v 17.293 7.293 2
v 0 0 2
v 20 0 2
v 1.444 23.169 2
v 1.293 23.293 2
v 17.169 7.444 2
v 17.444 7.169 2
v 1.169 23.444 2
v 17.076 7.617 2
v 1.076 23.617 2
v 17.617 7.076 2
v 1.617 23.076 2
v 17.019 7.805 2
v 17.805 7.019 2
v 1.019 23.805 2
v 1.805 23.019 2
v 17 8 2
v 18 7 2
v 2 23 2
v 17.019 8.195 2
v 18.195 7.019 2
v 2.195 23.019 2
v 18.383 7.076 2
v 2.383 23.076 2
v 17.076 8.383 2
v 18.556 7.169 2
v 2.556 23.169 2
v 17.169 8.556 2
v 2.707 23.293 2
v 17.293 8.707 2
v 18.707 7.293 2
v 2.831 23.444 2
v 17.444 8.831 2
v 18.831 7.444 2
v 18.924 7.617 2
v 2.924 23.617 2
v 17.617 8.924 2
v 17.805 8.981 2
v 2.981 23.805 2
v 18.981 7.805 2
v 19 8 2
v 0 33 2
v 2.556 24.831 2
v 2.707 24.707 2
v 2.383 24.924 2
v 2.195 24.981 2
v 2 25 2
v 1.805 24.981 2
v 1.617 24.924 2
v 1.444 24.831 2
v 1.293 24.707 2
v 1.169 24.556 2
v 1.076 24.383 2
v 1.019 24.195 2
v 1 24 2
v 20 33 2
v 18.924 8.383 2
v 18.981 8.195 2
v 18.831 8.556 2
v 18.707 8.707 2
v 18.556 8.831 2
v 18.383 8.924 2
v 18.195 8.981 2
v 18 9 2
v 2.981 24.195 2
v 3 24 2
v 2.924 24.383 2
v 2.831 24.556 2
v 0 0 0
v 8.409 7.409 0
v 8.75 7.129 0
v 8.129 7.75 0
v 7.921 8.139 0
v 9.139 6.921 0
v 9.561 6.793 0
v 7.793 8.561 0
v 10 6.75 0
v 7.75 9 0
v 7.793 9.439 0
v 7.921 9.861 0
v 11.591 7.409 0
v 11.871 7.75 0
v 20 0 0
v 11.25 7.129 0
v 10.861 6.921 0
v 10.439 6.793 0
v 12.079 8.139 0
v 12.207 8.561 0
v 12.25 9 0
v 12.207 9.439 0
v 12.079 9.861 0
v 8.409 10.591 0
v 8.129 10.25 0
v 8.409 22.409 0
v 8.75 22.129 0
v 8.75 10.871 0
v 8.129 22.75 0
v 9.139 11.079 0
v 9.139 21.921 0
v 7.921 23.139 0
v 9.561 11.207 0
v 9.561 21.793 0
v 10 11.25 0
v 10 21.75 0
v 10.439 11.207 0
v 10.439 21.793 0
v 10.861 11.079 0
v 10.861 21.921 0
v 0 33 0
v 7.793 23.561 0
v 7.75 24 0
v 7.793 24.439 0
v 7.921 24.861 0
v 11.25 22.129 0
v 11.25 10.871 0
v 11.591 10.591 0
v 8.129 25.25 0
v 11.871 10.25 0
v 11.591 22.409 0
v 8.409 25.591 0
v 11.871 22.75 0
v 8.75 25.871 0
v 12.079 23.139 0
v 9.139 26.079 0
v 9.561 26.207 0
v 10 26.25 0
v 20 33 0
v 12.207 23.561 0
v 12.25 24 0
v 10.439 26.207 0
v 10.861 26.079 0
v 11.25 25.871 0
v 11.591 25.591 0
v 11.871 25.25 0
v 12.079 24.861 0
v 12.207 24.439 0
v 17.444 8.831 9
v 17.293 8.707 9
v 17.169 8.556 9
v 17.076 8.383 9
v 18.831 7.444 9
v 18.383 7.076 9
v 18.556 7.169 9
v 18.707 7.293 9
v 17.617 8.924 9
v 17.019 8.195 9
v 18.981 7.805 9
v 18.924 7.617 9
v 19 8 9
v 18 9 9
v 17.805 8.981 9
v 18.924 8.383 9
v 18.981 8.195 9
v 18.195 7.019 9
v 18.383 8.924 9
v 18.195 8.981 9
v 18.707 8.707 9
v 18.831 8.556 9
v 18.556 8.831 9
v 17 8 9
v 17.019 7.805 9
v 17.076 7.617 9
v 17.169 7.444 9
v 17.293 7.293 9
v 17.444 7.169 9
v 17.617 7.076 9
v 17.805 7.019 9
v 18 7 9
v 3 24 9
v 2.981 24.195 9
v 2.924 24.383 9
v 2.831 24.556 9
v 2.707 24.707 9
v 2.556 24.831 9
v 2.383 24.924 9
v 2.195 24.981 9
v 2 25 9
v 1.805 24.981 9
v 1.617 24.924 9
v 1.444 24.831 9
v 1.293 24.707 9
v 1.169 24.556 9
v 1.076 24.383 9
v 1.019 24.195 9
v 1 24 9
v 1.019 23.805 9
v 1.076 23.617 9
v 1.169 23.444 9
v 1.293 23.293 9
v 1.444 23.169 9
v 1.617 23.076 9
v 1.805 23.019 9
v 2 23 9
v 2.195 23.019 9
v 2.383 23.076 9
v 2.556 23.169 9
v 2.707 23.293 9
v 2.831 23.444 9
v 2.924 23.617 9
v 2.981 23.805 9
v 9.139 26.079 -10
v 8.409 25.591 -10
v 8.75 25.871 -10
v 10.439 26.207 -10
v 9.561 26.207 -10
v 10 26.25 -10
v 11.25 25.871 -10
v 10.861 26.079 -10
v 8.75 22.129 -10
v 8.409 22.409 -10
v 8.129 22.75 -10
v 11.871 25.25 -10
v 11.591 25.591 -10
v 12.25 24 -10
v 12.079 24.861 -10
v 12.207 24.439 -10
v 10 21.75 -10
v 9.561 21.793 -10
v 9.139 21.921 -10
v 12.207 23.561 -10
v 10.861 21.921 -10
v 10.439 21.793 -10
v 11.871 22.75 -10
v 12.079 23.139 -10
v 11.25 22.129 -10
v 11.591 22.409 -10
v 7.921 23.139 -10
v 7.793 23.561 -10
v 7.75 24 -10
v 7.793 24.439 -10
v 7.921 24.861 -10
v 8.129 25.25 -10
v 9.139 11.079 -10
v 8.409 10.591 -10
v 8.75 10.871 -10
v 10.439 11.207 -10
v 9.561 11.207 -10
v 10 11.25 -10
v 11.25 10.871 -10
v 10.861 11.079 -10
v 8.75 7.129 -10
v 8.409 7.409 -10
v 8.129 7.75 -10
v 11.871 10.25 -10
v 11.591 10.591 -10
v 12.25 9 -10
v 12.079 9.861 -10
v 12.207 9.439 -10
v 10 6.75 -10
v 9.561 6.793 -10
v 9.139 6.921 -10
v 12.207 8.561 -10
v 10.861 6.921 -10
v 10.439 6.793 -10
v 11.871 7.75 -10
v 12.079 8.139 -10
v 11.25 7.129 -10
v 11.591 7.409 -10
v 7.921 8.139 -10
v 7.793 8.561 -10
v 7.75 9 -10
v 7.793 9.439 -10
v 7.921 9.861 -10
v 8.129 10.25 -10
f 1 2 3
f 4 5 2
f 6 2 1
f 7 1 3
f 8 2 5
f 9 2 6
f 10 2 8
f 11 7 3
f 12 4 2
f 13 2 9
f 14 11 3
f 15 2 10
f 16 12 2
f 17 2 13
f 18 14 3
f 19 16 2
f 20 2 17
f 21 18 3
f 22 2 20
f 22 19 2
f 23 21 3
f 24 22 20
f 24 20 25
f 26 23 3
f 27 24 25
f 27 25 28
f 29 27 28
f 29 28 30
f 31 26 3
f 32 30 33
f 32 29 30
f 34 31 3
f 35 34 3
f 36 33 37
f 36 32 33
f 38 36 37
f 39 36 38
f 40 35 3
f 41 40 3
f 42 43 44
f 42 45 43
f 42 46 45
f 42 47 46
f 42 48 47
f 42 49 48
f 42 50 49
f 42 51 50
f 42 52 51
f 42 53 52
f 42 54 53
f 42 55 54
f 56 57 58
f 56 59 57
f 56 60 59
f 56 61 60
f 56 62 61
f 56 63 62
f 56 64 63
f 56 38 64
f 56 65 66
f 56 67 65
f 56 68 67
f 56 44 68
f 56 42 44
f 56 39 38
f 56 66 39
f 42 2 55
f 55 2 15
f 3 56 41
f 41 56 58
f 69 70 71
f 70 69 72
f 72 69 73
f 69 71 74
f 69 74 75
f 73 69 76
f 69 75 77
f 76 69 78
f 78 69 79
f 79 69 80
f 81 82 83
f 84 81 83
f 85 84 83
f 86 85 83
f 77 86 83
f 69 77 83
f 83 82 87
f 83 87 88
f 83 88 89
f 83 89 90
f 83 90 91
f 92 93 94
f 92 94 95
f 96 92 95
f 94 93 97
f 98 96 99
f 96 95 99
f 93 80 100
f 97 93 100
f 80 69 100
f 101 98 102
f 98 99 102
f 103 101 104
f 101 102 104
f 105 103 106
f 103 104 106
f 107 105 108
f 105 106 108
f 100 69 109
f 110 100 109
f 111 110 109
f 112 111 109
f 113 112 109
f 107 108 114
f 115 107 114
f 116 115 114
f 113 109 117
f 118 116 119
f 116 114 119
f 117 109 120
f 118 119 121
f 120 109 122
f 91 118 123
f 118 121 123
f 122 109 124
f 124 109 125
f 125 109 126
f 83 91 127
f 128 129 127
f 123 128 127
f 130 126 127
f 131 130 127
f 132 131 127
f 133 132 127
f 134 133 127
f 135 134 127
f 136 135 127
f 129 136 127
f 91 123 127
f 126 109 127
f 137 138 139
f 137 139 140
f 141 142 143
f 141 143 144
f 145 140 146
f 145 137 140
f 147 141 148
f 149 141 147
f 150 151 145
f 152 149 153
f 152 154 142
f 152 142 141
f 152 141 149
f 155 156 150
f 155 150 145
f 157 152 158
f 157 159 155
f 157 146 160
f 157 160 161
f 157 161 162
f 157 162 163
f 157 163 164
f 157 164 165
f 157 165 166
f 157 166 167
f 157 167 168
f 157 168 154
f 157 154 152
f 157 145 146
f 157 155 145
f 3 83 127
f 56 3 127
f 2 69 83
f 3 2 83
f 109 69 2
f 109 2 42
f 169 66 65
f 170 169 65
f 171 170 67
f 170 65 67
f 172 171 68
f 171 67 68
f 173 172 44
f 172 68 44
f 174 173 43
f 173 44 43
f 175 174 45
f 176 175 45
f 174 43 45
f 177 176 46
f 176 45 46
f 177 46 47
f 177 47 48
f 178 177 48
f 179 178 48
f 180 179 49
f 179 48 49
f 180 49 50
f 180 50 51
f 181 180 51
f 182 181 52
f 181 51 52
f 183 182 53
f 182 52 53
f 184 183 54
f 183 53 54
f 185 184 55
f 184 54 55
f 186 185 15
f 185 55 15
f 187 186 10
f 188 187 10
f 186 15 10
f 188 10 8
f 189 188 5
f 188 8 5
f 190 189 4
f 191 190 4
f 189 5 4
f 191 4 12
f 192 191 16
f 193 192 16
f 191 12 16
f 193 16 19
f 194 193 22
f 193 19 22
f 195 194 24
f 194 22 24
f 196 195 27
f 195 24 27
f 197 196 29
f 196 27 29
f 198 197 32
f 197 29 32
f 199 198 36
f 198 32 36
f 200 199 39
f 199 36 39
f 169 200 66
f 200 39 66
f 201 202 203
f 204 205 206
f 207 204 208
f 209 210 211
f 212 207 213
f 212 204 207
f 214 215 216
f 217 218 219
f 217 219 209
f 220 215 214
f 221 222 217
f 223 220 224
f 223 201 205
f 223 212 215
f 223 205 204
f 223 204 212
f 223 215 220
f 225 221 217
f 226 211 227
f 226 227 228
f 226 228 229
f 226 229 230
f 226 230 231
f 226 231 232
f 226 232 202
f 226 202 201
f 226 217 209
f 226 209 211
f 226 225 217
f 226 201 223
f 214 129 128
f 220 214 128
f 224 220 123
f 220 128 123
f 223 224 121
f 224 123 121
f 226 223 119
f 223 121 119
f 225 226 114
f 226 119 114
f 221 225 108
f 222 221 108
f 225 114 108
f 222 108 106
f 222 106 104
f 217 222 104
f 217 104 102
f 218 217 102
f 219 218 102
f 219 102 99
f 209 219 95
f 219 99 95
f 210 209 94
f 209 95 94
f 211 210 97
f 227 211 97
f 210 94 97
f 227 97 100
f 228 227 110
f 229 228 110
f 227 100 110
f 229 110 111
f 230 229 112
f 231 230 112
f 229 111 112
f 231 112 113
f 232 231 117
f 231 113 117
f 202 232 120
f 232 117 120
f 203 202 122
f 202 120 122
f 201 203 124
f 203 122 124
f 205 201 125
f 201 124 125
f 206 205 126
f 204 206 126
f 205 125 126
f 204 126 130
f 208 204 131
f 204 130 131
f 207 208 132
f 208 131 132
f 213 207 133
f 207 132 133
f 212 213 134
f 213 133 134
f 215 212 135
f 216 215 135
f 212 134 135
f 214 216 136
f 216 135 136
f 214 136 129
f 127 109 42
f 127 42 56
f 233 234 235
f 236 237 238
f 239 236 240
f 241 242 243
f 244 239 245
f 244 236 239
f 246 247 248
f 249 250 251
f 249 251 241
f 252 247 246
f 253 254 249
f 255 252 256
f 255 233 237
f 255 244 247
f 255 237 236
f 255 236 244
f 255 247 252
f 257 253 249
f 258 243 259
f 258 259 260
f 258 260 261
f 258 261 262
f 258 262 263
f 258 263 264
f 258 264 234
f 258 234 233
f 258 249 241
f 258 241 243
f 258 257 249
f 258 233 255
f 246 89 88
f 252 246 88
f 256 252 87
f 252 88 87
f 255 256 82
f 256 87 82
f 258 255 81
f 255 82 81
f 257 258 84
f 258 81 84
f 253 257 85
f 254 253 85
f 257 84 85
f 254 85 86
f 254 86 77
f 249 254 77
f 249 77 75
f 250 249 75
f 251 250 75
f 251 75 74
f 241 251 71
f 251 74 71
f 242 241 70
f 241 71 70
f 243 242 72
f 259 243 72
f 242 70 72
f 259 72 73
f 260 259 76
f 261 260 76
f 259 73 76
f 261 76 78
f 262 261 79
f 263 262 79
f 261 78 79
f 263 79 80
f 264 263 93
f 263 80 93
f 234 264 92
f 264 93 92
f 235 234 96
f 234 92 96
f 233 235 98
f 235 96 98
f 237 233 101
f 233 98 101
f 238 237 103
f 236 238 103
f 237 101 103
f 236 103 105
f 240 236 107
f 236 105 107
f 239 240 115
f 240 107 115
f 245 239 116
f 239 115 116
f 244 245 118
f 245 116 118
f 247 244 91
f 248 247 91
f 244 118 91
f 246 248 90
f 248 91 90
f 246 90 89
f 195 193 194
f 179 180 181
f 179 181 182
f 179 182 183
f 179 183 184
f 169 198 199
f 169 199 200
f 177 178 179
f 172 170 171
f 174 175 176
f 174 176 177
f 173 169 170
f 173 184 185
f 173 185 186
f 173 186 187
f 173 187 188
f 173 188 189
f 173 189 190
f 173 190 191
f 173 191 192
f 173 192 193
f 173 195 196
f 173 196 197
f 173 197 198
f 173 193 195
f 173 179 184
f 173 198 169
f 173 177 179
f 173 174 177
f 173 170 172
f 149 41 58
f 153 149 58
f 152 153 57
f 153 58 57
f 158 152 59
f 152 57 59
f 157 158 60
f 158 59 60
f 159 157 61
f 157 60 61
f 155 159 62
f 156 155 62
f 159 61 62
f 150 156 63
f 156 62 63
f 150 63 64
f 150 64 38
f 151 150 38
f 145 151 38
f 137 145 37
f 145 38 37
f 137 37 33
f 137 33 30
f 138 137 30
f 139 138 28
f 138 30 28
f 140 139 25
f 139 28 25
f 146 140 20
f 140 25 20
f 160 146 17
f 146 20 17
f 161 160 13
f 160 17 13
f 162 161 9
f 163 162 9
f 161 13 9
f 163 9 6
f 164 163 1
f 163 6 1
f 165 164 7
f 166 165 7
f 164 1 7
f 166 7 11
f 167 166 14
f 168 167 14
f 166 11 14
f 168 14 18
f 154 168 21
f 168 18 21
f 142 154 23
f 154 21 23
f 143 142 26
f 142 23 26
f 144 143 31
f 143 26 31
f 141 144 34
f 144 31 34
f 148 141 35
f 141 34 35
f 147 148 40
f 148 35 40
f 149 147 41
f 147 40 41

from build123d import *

# Parameters (mm, degrees)
SKETCH001_R      = 2.25
EXTRUDE001_DEPTH = 10
SKETCH_R         = 1
EXTRUDE_DEPTH    = 7
BOX_W            = 20
BOX_H            = 33
BOX_DEPTH        = 2


with BuildPart() as extrude001:
    # Sketch001 (on Face5 of Fusion) → Extrude001 (new body)
    with BuildSketch(Plane(origin=(0, 0, 0), x_dir=(1, 0, 0), z_dir=(0, 0, -1))):
        with Locations((10, -9)):
            Circle(SKETCH001_R)
        with Locations((10, -24)):
            Circle(SKETCH001_R)
    extrude(amount=EXTRUDE001_DEPTH)


with BuildPart() as extrude_body:
    # Sketch (on Face6 of Box) → Extrude (new body)
    with BuildSketch(Plane.XY.offset(2)):
        with Locations((18, 8)):
            Circle(SKETCH_R)
        with Locations((2, 24)):
            Circle(SKETCH_R)
    extrude(amount=EXTRUDE_DEPTH)


with BuildPart() as fusion001:
    # Box → Box (new body)
    with BuildSketch(Plane.XY):
        with Locations((10, 16.5)):
            Rectangle(BOX_W, BOX_H)
    extrude(amount=BOX_DEPTH)

    # Fusion: union Extrude body
    add(extrude_body.part)

    # Fusion001: union Extrude001
    add(extrude001.part)


solid = fusion001.part
